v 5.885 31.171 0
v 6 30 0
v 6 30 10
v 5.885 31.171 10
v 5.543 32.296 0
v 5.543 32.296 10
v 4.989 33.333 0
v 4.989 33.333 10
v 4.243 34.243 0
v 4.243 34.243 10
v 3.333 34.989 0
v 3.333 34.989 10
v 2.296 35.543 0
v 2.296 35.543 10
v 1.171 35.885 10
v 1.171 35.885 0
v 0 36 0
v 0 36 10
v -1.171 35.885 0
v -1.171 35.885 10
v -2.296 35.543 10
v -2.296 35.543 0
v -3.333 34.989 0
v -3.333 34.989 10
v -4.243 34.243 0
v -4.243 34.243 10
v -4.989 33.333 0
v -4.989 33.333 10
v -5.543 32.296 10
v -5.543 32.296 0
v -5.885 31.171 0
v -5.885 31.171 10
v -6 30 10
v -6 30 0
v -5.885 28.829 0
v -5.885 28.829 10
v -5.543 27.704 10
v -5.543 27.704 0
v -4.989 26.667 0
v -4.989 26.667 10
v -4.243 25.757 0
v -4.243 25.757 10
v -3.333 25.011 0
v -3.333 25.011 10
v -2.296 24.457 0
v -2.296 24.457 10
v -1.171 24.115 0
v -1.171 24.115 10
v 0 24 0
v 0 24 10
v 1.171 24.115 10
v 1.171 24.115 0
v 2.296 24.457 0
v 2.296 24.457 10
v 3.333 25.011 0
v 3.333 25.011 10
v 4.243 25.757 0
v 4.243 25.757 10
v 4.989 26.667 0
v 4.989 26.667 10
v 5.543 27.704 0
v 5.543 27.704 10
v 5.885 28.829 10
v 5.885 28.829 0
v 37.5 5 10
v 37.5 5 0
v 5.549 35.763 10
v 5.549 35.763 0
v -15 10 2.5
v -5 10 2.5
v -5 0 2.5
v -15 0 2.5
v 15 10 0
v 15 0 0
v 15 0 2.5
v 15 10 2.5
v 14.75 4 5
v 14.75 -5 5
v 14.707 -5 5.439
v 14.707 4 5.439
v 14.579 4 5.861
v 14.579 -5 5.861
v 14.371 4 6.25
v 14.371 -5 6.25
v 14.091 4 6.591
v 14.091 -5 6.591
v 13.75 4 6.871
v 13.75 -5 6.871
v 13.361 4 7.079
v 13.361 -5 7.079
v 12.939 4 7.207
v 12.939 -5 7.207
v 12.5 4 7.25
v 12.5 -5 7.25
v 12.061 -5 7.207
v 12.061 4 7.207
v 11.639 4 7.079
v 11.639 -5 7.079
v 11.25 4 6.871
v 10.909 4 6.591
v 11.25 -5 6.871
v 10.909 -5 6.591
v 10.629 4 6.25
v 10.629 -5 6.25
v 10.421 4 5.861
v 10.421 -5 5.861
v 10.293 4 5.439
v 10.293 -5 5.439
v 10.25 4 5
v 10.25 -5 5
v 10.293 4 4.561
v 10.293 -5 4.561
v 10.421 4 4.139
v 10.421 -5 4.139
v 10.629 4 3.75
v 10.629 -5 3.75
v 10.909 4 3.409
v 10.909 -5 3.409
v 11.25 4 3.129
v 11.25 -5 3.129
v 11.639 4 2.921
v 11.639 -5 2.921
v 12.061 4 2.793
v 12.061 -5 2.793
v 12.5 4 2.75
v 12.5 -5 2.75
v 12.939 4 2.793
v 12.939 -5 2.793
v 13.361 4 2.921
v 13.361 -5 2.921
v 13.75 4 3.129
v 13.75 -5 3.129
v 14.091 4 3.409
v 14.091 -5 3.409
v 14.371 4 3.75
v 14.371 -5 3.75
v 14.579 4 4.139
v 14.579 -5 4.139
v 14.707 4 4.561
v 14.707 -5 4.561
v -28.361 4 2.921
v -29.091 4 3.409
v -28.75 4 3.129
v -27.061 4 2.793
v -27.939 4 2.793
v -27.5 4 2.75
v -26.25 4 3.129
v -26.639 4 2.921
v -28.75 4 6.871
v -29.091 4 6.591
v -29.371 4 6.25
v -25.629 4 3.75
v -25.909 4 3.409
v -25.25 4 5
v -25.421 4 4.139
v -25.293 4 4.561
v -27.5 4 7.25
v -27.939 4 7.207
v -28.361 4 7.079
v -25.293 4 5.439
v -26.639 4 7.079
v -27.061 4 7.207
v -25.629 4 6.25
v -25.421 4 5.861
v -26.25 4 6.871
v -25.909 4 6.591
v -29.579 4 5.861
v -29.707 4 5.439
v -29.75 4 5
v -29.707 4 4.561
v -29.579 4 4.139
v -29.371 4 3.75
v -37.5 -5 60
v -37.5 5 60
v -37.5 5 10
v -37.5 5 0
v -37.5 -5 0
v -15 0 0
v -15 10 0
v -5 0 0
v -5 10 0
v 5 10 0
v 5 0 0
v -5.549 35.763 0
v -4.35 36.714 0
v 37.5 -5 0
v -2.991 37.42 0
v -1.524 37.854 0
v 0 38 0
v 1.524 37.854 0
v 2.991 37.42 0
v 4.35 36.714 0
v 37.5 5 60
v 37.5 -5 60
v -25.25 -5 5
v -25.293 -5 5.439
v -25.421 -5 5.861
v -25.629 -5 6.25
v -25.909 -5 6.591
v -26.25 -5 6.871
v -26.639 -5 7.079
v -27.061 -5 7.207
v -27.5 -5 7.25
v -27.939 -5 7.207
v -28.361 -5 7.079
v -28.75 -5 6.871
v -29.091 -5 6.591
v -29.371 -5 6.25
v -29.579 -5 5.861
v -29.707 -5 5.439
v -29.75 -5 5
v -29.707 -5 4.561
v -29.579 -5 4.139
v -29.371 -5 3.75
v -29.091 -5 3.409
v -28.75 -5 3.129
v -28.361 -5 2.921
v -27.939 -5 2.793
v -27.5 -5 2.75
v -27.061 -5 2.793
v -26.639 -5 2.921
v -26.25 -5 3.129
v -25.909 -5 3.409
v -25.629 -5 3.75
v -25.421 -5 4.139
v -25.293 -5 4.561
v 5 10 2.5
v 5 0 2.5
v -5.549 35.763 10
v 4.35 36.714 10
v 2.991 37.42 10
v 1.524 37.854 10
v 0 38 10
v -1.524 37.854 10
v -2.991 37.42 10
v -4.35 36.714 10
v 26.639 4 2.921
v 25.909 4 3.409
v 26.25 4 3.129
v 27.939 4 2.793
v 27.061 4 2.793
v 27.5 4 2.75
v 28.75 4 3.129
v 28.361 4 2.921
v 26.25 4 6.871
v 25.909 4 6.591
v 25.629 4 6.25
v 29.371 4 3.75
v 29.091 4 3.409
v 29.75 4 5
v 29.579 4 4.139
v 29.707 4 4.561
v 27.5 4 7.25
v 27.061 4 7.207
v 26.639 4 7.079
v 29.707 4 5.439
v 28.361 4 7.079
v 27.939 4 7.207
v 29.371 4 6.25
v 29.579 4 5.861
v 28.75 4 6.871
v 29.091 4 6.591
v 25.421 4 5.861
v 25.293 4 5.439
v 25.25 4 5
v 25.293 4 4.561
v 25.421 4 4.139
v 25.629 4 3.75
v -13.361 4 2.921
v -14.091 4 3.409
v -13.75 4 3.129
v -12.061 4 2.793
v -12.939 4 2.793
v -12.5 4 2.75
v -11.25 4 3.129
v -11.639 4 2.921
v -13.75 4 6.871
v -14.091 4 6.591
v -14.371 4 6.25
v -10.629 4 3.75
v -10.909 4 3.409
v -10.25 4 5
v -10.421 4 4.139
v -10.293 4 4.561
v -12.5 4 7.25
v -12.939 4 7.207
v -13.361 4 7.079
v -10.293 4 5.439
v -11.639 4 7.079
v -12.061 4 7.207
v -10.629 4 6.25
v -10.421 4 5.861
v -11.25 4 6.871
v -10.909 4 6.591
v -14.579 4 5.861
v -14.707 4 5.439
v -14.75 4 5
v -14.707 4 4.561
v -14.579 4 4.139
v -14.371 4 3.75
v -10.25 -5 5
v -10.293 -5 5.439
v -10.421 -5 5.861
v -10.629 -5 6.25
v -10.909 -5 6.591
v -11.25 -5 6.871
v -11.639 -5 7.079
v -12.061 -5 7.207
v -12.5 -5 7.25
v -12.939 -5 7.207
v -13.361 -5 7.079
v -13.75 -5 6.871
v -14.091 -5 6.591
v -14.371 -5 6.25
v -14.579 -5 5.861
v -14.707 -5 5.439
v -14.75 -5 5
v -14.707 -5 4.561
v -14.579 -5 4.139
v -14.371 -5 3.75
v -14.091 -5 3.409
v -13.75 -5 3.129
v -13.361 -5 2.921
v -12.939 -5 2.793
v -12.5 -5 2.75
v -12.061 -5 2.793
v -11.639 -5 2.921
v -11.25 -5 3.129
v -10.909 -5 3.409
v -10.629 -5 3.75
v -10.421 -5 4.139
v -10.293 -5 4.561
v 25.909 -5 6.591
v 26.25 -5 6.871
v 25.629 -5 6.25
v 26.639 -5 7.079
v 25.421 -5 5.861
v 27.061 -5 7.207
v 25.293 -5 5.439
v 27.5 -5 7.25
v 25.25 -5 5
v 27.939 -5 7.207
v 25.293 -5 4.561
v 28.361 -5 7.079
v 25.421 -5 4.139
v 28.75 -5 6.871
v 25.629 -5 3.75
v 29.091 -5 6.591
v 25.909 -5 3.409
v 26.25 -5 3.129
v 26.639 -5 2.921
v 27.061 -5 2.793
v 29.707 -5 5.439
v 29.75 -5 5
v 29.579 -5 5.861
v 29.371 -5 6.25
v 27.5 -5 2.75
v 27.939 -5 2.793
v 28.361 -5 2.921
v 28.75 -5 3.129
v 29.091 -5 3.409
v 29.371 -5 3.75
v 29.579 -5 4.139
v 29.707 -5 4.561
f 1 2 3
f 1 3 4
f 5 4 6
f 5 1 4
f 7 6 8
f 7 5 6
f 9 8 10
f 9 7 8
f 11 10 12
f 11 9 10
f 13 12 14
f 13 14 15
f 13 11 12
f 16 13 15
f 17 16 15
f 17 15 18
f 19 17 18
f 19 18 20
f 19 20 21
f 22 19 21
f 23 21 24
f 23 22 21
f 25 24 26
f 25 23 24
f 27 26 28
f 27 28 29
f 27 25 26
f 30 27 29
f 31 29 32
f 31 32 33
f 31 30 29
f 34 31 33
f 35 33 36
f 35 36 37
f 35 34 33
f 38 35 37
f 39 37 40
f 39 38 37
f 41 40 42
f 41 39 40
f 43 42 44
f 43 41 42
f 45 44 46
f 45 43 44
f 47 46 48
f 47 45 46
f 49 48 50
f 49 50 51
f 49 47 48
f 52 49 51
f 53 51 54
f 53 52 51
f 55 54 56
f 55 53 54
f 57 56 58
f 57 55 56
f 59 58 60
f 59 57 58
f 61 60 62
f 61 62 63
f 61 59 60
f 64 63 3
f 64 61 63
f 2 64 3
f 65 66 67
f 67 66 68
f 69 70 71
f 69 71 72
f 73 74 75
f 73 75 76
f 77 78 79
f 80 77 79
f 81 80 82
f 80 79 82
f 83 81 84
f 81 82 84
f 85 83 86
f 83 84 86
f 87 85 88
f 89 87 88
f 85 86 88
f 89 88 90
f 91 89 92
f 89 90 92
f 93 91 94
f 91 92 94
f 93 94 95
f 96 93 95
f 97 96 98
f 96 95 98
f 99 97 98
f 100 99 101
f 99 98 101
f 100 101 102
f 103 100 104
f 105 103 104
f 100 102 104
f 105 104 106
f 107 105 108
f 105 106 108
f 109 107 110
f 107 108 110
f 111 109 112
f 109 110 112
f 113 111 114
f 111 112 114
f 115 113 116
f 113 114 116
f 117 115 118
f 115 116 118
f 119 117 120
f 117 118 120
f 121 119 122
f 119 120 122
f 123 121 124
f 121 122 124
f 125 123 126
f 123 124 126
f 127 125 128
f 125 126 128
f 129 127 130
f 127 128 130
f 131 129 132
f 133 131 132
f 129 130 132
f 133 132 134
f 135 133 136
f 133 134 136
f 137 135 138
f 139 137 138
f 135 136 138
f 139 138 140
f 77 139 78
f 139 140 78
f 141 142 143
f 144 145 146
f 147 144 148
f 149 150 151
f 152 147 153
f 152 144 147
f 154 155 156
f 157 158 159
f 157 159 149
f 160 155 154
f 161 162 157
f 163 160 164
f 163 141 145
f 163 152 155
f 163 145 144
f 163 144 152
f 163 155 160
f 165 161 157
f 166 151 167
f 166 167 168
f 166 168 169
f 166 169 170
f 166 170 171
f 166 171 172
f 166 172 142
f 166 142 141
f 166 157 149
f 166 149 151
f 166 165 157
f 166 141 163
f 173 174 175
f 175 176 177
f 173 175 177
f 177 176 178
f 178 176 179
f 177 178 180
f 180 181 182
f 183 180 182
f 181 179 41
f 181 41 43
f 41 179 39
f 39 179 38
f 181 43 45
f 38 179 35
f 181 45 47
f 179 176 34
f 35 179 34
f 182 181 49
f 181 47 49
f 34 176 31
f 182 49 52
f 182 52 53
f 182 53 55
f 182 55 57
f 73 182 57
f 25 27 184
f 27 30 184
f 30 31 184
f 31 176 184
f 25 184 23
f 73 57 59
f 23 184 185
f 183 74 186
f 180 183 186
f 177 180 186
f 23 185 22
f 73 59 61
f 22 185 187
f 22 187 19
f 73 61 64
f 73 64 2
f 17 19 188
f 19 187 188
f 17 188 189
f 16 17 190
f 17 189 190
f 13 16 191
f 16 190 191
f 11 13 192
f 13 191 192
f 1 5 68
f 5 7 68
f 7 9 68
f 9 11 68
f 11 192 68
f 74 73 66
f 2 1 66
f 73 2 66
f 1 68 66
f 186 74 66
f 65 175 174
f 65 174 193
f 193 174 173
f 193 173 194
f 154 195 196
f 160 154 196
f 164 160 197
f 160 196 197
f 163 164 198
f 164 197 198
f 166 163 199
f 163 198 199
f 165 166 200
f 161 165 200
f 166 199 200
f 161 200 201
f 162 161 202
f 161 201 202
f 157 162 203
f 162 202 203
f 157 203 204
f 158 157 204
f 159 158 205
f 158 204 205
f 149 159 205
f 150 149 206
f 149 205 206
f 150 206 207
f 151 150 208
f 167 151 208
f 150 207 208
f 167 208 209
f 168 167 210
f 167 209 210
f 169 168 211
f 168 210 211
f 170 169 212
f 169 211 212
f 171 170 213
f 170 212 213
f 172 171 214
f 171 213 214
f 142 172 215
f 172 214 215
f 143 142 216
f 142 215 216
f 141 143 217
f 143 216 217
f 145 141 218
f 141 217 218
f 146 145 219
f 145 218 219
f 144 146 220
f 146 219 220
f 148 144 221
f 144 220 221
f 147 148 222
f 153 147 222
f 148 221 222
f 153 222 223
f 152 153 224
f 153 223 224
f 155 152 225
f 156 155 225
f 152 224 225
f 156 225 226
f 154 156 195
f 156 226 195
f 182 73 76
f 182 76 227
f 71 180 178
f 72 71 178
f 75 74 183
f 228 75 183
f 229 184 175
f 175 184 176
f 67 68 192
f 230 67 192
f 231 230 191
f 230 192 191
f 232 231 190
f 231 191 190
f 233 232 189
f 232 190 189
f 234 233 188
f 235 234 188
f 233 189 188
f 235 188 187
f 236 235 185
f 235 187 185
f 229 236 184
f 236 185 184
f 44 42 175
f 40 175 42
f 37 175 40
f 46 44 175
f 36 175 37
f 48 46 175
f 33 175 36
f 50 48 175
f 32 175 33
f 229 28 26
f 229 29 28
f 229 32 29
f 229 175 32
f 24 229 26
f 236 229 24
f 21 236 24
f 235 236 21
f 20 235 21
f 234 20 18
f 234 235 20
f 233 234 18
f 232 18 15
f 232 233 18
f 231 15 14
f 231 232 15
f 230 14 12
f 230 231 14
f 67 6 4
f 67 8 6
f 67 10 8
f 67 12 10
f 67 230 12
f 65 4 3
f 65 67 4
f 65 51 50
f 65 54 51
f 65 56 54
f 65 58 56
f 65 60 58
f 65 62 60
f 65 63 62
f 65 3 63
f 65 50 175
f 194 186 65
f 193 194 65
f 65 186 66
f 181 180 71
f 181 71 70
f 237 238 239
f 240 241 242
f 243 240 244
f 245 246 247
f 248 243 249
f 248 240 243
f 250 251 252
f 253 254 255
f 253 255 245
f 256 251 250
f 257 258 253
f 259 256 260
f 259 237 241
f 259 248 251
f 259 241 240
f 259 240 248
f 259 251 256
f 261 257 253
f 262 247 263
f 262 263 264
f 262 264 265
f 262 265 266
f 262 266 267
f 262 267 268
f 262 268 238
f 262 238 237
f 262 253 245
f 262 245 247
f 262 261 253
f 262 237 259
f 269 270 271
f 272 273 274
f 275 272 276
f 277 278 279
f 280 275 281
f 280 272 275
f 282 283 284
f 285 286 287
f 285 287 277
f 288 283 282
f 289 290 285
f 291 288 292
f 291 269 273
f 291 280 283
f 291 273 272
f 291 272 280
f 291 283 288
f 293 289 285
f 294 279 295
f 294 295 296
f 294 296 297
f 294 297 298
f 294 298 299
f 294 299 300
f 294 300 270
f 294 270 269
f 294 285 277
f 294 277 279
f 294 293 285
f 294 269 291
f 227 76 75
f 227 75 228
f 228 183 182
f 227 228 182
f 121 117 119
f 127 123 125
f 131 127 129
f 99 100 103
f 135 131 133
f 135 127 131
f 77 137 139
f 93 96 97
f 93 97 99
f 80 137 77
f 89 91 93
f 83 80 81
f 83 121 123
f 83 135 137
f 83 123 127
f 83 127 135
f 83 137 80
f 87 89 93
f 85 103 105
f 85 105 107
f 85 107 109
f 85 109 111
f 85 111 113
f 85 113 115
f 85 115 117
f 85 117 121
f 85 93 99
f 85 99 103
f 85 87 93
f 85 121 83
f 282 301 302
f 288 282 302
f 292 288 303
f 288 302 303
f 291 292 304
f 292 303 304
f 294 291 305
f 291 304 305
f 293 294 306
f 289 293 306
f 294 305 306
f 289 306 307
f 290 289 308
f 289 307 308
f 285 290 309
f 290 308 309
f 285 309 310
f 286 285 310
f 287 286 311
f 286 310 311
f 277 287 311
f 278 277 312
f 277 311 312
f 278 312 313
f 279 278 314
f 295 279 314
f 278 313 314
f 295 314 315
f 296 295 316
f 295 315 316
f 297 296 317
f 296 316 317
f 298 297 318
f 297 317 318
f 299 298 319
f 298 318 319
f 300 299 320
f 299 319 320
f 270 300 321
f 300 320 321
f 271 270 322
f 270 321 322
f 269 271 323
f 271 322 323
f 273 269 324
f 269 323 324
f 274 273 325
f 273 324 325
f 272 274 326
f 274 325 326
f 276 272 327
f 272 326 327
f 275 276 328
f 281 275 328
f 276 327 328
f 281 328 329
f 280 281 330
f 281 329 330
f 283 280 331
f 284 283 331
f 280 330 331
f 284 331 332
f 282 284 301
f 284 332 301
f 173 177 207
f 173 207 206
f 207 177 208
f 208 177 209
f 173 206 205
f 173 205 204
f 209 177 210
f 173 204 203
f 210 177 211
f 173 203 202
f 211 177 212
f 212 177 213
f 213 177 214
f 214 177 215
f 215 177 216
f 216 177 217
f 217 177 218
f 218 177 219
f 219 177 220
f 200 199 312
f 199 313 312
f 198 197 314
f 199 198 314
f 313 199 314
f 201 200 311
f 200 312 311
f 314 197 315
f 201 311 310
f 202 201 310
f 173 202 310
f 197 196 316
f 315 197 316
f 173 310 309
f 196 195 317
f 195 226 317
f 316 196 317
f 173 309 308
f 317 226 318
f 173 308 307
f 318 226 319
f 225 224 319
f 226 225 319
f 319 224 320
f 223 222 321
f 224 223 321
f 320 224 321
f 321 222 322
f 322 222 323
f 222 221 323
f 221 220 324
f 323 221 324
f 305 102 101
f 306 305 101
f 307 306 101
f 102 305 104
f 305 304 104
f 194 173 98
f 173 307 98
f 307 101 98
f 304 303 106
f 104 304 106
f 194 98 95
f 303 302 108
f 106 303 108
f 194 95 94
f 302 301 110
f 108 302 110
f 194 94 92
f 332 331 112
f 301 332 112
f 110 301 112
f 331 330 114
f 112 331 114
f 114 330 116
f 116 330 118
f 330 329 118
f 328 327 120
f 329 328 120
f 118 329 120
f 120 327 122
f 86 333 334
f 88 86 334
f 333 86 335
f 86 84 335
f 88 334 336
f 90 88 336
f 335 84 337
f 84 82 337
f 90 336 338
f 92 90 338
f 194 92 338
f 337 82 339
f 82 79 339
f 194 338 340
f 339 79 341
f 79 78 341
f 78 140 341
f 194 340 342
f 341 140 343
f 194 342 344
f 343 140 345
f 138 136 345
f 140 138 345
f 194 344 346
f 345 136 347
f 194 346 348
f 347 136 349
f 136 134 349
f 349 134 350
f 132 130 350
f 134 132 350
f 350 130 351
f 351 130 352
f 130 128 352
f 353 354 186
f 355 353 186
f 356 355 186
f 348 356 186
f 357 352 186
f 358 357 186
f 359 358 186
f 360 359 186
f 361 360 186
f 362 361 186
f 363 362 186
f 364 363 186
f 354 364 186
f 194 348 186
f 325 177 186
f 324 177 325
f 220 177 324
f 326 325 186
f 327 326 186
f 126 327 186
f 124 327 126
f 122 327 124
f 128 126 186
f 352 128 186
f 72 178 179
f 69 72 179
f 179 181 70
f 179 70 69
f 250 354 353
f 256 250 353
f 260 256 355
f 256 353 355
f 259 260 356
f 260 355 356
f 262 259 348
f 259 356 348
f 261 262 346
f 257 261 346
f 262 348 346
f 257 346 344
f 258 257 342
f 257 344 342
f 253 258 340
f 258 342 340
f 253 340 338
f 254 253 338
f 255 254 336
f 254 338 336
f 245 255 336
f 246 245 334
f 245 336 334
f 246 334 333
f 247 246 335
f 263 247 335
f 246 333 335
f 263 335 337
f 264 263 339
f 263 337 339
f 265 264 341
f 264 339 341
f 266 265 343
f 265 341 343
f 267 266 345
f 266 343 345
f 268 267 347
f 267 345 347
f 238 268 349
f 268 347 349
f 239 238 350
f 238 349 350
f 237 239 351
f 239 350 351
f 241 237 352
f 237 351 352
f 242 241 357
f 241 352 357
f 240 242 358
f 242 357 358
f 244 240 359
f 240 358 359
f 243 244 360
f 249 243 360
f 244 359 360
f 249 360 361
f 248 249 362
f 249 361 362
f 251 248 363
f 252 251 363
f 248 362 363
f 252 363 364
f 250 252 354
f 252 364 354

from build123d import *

# Parameters (mm, degrees)
SKETCH2_R           = 6
BOSS_EXTRUDE1_DEPTH = 10
SKETCH3_W           = 75
SKETCH3_H           = 10
BOSS_EXTRUDE2_DEPTH = 60
SKETCH4_R           = 2.25
CUT_EXTRUDE1_DEPTH  = 9
SKETCH5_W           = 10
SKETCH5_H           = 10
CUT_EXTRUDE2_DEPTH  = 2.5


with BuildPart() as part:
    # Sketch2 → Boss-Extrude1 (new body)
    with BuildSketch(Plane.XY):
        with BuildLine():
            Line((-37.5, -5), (37.5, -5))
            Line((37.5, -5), (37.5, 5))
            Line((37.5, 5), (5.548671219, 35.763006828))
            ThreePointArc((5.548671219, 35.763006828), (0, 38), (-5.548671219, 35.763006828))
            Line((-5.548671219, 35.763006828), (-37.5, 5))
            Line((-37.5, 5), (-37.5, -5))
        make_face()
        with Locations((0, 30)):
            Circle(SKETCH2_R, mode=Mode.SUBTRACT)
    extrude(amount=BOSS_EXTRUDE1_DEPTH)

    # Sketch3 → Boss-Extrude2 (add)
    with BuildSketch(Plane.XY):
        Rectangle(SKETCH3_W, SKETCH3_H)
    extrude(amount=BOSS_EXTRUDE2_DEPTH)

    # Sketch4 → Cut-Extrude1 (cut)
    with BuildSketch(Plane.XZ.offset(5)):
        with Locations((27.5, 5)):
            Circle(SKETCH4_R)
        with Locations((12.5, 5)):
            Circle(SKETCH4_R)
        with Locations((-12.5, 5)):
            Circle(SKETCH4_R)
        with Locations((-27.5, 5)):
            Circle(SKETCH4_R)
    extrude(amount=-CUT_EXTRUDE1_DEPTH, mode=Mode.SUBTRACT)

    # Sketch5 → Cut-Extrude2 (cut)
    with BuildSketch(Plane(origin=(0, 0, 0), x_dir=(-1, 0, 0), z_dir=(0, 0, -1))):
        with Locations((-10, 5)):
            Rectangle(SKETCH5_W, SKETCH5_H)
        with Locations((10, 5)):
            Rectangle(SKETCH5_W, SKETCH5_H)
    extrude(amount=-CUT_EXTRUDE2_DEPTH, mode=Mode.SUBTRACT)


solid = part.part
